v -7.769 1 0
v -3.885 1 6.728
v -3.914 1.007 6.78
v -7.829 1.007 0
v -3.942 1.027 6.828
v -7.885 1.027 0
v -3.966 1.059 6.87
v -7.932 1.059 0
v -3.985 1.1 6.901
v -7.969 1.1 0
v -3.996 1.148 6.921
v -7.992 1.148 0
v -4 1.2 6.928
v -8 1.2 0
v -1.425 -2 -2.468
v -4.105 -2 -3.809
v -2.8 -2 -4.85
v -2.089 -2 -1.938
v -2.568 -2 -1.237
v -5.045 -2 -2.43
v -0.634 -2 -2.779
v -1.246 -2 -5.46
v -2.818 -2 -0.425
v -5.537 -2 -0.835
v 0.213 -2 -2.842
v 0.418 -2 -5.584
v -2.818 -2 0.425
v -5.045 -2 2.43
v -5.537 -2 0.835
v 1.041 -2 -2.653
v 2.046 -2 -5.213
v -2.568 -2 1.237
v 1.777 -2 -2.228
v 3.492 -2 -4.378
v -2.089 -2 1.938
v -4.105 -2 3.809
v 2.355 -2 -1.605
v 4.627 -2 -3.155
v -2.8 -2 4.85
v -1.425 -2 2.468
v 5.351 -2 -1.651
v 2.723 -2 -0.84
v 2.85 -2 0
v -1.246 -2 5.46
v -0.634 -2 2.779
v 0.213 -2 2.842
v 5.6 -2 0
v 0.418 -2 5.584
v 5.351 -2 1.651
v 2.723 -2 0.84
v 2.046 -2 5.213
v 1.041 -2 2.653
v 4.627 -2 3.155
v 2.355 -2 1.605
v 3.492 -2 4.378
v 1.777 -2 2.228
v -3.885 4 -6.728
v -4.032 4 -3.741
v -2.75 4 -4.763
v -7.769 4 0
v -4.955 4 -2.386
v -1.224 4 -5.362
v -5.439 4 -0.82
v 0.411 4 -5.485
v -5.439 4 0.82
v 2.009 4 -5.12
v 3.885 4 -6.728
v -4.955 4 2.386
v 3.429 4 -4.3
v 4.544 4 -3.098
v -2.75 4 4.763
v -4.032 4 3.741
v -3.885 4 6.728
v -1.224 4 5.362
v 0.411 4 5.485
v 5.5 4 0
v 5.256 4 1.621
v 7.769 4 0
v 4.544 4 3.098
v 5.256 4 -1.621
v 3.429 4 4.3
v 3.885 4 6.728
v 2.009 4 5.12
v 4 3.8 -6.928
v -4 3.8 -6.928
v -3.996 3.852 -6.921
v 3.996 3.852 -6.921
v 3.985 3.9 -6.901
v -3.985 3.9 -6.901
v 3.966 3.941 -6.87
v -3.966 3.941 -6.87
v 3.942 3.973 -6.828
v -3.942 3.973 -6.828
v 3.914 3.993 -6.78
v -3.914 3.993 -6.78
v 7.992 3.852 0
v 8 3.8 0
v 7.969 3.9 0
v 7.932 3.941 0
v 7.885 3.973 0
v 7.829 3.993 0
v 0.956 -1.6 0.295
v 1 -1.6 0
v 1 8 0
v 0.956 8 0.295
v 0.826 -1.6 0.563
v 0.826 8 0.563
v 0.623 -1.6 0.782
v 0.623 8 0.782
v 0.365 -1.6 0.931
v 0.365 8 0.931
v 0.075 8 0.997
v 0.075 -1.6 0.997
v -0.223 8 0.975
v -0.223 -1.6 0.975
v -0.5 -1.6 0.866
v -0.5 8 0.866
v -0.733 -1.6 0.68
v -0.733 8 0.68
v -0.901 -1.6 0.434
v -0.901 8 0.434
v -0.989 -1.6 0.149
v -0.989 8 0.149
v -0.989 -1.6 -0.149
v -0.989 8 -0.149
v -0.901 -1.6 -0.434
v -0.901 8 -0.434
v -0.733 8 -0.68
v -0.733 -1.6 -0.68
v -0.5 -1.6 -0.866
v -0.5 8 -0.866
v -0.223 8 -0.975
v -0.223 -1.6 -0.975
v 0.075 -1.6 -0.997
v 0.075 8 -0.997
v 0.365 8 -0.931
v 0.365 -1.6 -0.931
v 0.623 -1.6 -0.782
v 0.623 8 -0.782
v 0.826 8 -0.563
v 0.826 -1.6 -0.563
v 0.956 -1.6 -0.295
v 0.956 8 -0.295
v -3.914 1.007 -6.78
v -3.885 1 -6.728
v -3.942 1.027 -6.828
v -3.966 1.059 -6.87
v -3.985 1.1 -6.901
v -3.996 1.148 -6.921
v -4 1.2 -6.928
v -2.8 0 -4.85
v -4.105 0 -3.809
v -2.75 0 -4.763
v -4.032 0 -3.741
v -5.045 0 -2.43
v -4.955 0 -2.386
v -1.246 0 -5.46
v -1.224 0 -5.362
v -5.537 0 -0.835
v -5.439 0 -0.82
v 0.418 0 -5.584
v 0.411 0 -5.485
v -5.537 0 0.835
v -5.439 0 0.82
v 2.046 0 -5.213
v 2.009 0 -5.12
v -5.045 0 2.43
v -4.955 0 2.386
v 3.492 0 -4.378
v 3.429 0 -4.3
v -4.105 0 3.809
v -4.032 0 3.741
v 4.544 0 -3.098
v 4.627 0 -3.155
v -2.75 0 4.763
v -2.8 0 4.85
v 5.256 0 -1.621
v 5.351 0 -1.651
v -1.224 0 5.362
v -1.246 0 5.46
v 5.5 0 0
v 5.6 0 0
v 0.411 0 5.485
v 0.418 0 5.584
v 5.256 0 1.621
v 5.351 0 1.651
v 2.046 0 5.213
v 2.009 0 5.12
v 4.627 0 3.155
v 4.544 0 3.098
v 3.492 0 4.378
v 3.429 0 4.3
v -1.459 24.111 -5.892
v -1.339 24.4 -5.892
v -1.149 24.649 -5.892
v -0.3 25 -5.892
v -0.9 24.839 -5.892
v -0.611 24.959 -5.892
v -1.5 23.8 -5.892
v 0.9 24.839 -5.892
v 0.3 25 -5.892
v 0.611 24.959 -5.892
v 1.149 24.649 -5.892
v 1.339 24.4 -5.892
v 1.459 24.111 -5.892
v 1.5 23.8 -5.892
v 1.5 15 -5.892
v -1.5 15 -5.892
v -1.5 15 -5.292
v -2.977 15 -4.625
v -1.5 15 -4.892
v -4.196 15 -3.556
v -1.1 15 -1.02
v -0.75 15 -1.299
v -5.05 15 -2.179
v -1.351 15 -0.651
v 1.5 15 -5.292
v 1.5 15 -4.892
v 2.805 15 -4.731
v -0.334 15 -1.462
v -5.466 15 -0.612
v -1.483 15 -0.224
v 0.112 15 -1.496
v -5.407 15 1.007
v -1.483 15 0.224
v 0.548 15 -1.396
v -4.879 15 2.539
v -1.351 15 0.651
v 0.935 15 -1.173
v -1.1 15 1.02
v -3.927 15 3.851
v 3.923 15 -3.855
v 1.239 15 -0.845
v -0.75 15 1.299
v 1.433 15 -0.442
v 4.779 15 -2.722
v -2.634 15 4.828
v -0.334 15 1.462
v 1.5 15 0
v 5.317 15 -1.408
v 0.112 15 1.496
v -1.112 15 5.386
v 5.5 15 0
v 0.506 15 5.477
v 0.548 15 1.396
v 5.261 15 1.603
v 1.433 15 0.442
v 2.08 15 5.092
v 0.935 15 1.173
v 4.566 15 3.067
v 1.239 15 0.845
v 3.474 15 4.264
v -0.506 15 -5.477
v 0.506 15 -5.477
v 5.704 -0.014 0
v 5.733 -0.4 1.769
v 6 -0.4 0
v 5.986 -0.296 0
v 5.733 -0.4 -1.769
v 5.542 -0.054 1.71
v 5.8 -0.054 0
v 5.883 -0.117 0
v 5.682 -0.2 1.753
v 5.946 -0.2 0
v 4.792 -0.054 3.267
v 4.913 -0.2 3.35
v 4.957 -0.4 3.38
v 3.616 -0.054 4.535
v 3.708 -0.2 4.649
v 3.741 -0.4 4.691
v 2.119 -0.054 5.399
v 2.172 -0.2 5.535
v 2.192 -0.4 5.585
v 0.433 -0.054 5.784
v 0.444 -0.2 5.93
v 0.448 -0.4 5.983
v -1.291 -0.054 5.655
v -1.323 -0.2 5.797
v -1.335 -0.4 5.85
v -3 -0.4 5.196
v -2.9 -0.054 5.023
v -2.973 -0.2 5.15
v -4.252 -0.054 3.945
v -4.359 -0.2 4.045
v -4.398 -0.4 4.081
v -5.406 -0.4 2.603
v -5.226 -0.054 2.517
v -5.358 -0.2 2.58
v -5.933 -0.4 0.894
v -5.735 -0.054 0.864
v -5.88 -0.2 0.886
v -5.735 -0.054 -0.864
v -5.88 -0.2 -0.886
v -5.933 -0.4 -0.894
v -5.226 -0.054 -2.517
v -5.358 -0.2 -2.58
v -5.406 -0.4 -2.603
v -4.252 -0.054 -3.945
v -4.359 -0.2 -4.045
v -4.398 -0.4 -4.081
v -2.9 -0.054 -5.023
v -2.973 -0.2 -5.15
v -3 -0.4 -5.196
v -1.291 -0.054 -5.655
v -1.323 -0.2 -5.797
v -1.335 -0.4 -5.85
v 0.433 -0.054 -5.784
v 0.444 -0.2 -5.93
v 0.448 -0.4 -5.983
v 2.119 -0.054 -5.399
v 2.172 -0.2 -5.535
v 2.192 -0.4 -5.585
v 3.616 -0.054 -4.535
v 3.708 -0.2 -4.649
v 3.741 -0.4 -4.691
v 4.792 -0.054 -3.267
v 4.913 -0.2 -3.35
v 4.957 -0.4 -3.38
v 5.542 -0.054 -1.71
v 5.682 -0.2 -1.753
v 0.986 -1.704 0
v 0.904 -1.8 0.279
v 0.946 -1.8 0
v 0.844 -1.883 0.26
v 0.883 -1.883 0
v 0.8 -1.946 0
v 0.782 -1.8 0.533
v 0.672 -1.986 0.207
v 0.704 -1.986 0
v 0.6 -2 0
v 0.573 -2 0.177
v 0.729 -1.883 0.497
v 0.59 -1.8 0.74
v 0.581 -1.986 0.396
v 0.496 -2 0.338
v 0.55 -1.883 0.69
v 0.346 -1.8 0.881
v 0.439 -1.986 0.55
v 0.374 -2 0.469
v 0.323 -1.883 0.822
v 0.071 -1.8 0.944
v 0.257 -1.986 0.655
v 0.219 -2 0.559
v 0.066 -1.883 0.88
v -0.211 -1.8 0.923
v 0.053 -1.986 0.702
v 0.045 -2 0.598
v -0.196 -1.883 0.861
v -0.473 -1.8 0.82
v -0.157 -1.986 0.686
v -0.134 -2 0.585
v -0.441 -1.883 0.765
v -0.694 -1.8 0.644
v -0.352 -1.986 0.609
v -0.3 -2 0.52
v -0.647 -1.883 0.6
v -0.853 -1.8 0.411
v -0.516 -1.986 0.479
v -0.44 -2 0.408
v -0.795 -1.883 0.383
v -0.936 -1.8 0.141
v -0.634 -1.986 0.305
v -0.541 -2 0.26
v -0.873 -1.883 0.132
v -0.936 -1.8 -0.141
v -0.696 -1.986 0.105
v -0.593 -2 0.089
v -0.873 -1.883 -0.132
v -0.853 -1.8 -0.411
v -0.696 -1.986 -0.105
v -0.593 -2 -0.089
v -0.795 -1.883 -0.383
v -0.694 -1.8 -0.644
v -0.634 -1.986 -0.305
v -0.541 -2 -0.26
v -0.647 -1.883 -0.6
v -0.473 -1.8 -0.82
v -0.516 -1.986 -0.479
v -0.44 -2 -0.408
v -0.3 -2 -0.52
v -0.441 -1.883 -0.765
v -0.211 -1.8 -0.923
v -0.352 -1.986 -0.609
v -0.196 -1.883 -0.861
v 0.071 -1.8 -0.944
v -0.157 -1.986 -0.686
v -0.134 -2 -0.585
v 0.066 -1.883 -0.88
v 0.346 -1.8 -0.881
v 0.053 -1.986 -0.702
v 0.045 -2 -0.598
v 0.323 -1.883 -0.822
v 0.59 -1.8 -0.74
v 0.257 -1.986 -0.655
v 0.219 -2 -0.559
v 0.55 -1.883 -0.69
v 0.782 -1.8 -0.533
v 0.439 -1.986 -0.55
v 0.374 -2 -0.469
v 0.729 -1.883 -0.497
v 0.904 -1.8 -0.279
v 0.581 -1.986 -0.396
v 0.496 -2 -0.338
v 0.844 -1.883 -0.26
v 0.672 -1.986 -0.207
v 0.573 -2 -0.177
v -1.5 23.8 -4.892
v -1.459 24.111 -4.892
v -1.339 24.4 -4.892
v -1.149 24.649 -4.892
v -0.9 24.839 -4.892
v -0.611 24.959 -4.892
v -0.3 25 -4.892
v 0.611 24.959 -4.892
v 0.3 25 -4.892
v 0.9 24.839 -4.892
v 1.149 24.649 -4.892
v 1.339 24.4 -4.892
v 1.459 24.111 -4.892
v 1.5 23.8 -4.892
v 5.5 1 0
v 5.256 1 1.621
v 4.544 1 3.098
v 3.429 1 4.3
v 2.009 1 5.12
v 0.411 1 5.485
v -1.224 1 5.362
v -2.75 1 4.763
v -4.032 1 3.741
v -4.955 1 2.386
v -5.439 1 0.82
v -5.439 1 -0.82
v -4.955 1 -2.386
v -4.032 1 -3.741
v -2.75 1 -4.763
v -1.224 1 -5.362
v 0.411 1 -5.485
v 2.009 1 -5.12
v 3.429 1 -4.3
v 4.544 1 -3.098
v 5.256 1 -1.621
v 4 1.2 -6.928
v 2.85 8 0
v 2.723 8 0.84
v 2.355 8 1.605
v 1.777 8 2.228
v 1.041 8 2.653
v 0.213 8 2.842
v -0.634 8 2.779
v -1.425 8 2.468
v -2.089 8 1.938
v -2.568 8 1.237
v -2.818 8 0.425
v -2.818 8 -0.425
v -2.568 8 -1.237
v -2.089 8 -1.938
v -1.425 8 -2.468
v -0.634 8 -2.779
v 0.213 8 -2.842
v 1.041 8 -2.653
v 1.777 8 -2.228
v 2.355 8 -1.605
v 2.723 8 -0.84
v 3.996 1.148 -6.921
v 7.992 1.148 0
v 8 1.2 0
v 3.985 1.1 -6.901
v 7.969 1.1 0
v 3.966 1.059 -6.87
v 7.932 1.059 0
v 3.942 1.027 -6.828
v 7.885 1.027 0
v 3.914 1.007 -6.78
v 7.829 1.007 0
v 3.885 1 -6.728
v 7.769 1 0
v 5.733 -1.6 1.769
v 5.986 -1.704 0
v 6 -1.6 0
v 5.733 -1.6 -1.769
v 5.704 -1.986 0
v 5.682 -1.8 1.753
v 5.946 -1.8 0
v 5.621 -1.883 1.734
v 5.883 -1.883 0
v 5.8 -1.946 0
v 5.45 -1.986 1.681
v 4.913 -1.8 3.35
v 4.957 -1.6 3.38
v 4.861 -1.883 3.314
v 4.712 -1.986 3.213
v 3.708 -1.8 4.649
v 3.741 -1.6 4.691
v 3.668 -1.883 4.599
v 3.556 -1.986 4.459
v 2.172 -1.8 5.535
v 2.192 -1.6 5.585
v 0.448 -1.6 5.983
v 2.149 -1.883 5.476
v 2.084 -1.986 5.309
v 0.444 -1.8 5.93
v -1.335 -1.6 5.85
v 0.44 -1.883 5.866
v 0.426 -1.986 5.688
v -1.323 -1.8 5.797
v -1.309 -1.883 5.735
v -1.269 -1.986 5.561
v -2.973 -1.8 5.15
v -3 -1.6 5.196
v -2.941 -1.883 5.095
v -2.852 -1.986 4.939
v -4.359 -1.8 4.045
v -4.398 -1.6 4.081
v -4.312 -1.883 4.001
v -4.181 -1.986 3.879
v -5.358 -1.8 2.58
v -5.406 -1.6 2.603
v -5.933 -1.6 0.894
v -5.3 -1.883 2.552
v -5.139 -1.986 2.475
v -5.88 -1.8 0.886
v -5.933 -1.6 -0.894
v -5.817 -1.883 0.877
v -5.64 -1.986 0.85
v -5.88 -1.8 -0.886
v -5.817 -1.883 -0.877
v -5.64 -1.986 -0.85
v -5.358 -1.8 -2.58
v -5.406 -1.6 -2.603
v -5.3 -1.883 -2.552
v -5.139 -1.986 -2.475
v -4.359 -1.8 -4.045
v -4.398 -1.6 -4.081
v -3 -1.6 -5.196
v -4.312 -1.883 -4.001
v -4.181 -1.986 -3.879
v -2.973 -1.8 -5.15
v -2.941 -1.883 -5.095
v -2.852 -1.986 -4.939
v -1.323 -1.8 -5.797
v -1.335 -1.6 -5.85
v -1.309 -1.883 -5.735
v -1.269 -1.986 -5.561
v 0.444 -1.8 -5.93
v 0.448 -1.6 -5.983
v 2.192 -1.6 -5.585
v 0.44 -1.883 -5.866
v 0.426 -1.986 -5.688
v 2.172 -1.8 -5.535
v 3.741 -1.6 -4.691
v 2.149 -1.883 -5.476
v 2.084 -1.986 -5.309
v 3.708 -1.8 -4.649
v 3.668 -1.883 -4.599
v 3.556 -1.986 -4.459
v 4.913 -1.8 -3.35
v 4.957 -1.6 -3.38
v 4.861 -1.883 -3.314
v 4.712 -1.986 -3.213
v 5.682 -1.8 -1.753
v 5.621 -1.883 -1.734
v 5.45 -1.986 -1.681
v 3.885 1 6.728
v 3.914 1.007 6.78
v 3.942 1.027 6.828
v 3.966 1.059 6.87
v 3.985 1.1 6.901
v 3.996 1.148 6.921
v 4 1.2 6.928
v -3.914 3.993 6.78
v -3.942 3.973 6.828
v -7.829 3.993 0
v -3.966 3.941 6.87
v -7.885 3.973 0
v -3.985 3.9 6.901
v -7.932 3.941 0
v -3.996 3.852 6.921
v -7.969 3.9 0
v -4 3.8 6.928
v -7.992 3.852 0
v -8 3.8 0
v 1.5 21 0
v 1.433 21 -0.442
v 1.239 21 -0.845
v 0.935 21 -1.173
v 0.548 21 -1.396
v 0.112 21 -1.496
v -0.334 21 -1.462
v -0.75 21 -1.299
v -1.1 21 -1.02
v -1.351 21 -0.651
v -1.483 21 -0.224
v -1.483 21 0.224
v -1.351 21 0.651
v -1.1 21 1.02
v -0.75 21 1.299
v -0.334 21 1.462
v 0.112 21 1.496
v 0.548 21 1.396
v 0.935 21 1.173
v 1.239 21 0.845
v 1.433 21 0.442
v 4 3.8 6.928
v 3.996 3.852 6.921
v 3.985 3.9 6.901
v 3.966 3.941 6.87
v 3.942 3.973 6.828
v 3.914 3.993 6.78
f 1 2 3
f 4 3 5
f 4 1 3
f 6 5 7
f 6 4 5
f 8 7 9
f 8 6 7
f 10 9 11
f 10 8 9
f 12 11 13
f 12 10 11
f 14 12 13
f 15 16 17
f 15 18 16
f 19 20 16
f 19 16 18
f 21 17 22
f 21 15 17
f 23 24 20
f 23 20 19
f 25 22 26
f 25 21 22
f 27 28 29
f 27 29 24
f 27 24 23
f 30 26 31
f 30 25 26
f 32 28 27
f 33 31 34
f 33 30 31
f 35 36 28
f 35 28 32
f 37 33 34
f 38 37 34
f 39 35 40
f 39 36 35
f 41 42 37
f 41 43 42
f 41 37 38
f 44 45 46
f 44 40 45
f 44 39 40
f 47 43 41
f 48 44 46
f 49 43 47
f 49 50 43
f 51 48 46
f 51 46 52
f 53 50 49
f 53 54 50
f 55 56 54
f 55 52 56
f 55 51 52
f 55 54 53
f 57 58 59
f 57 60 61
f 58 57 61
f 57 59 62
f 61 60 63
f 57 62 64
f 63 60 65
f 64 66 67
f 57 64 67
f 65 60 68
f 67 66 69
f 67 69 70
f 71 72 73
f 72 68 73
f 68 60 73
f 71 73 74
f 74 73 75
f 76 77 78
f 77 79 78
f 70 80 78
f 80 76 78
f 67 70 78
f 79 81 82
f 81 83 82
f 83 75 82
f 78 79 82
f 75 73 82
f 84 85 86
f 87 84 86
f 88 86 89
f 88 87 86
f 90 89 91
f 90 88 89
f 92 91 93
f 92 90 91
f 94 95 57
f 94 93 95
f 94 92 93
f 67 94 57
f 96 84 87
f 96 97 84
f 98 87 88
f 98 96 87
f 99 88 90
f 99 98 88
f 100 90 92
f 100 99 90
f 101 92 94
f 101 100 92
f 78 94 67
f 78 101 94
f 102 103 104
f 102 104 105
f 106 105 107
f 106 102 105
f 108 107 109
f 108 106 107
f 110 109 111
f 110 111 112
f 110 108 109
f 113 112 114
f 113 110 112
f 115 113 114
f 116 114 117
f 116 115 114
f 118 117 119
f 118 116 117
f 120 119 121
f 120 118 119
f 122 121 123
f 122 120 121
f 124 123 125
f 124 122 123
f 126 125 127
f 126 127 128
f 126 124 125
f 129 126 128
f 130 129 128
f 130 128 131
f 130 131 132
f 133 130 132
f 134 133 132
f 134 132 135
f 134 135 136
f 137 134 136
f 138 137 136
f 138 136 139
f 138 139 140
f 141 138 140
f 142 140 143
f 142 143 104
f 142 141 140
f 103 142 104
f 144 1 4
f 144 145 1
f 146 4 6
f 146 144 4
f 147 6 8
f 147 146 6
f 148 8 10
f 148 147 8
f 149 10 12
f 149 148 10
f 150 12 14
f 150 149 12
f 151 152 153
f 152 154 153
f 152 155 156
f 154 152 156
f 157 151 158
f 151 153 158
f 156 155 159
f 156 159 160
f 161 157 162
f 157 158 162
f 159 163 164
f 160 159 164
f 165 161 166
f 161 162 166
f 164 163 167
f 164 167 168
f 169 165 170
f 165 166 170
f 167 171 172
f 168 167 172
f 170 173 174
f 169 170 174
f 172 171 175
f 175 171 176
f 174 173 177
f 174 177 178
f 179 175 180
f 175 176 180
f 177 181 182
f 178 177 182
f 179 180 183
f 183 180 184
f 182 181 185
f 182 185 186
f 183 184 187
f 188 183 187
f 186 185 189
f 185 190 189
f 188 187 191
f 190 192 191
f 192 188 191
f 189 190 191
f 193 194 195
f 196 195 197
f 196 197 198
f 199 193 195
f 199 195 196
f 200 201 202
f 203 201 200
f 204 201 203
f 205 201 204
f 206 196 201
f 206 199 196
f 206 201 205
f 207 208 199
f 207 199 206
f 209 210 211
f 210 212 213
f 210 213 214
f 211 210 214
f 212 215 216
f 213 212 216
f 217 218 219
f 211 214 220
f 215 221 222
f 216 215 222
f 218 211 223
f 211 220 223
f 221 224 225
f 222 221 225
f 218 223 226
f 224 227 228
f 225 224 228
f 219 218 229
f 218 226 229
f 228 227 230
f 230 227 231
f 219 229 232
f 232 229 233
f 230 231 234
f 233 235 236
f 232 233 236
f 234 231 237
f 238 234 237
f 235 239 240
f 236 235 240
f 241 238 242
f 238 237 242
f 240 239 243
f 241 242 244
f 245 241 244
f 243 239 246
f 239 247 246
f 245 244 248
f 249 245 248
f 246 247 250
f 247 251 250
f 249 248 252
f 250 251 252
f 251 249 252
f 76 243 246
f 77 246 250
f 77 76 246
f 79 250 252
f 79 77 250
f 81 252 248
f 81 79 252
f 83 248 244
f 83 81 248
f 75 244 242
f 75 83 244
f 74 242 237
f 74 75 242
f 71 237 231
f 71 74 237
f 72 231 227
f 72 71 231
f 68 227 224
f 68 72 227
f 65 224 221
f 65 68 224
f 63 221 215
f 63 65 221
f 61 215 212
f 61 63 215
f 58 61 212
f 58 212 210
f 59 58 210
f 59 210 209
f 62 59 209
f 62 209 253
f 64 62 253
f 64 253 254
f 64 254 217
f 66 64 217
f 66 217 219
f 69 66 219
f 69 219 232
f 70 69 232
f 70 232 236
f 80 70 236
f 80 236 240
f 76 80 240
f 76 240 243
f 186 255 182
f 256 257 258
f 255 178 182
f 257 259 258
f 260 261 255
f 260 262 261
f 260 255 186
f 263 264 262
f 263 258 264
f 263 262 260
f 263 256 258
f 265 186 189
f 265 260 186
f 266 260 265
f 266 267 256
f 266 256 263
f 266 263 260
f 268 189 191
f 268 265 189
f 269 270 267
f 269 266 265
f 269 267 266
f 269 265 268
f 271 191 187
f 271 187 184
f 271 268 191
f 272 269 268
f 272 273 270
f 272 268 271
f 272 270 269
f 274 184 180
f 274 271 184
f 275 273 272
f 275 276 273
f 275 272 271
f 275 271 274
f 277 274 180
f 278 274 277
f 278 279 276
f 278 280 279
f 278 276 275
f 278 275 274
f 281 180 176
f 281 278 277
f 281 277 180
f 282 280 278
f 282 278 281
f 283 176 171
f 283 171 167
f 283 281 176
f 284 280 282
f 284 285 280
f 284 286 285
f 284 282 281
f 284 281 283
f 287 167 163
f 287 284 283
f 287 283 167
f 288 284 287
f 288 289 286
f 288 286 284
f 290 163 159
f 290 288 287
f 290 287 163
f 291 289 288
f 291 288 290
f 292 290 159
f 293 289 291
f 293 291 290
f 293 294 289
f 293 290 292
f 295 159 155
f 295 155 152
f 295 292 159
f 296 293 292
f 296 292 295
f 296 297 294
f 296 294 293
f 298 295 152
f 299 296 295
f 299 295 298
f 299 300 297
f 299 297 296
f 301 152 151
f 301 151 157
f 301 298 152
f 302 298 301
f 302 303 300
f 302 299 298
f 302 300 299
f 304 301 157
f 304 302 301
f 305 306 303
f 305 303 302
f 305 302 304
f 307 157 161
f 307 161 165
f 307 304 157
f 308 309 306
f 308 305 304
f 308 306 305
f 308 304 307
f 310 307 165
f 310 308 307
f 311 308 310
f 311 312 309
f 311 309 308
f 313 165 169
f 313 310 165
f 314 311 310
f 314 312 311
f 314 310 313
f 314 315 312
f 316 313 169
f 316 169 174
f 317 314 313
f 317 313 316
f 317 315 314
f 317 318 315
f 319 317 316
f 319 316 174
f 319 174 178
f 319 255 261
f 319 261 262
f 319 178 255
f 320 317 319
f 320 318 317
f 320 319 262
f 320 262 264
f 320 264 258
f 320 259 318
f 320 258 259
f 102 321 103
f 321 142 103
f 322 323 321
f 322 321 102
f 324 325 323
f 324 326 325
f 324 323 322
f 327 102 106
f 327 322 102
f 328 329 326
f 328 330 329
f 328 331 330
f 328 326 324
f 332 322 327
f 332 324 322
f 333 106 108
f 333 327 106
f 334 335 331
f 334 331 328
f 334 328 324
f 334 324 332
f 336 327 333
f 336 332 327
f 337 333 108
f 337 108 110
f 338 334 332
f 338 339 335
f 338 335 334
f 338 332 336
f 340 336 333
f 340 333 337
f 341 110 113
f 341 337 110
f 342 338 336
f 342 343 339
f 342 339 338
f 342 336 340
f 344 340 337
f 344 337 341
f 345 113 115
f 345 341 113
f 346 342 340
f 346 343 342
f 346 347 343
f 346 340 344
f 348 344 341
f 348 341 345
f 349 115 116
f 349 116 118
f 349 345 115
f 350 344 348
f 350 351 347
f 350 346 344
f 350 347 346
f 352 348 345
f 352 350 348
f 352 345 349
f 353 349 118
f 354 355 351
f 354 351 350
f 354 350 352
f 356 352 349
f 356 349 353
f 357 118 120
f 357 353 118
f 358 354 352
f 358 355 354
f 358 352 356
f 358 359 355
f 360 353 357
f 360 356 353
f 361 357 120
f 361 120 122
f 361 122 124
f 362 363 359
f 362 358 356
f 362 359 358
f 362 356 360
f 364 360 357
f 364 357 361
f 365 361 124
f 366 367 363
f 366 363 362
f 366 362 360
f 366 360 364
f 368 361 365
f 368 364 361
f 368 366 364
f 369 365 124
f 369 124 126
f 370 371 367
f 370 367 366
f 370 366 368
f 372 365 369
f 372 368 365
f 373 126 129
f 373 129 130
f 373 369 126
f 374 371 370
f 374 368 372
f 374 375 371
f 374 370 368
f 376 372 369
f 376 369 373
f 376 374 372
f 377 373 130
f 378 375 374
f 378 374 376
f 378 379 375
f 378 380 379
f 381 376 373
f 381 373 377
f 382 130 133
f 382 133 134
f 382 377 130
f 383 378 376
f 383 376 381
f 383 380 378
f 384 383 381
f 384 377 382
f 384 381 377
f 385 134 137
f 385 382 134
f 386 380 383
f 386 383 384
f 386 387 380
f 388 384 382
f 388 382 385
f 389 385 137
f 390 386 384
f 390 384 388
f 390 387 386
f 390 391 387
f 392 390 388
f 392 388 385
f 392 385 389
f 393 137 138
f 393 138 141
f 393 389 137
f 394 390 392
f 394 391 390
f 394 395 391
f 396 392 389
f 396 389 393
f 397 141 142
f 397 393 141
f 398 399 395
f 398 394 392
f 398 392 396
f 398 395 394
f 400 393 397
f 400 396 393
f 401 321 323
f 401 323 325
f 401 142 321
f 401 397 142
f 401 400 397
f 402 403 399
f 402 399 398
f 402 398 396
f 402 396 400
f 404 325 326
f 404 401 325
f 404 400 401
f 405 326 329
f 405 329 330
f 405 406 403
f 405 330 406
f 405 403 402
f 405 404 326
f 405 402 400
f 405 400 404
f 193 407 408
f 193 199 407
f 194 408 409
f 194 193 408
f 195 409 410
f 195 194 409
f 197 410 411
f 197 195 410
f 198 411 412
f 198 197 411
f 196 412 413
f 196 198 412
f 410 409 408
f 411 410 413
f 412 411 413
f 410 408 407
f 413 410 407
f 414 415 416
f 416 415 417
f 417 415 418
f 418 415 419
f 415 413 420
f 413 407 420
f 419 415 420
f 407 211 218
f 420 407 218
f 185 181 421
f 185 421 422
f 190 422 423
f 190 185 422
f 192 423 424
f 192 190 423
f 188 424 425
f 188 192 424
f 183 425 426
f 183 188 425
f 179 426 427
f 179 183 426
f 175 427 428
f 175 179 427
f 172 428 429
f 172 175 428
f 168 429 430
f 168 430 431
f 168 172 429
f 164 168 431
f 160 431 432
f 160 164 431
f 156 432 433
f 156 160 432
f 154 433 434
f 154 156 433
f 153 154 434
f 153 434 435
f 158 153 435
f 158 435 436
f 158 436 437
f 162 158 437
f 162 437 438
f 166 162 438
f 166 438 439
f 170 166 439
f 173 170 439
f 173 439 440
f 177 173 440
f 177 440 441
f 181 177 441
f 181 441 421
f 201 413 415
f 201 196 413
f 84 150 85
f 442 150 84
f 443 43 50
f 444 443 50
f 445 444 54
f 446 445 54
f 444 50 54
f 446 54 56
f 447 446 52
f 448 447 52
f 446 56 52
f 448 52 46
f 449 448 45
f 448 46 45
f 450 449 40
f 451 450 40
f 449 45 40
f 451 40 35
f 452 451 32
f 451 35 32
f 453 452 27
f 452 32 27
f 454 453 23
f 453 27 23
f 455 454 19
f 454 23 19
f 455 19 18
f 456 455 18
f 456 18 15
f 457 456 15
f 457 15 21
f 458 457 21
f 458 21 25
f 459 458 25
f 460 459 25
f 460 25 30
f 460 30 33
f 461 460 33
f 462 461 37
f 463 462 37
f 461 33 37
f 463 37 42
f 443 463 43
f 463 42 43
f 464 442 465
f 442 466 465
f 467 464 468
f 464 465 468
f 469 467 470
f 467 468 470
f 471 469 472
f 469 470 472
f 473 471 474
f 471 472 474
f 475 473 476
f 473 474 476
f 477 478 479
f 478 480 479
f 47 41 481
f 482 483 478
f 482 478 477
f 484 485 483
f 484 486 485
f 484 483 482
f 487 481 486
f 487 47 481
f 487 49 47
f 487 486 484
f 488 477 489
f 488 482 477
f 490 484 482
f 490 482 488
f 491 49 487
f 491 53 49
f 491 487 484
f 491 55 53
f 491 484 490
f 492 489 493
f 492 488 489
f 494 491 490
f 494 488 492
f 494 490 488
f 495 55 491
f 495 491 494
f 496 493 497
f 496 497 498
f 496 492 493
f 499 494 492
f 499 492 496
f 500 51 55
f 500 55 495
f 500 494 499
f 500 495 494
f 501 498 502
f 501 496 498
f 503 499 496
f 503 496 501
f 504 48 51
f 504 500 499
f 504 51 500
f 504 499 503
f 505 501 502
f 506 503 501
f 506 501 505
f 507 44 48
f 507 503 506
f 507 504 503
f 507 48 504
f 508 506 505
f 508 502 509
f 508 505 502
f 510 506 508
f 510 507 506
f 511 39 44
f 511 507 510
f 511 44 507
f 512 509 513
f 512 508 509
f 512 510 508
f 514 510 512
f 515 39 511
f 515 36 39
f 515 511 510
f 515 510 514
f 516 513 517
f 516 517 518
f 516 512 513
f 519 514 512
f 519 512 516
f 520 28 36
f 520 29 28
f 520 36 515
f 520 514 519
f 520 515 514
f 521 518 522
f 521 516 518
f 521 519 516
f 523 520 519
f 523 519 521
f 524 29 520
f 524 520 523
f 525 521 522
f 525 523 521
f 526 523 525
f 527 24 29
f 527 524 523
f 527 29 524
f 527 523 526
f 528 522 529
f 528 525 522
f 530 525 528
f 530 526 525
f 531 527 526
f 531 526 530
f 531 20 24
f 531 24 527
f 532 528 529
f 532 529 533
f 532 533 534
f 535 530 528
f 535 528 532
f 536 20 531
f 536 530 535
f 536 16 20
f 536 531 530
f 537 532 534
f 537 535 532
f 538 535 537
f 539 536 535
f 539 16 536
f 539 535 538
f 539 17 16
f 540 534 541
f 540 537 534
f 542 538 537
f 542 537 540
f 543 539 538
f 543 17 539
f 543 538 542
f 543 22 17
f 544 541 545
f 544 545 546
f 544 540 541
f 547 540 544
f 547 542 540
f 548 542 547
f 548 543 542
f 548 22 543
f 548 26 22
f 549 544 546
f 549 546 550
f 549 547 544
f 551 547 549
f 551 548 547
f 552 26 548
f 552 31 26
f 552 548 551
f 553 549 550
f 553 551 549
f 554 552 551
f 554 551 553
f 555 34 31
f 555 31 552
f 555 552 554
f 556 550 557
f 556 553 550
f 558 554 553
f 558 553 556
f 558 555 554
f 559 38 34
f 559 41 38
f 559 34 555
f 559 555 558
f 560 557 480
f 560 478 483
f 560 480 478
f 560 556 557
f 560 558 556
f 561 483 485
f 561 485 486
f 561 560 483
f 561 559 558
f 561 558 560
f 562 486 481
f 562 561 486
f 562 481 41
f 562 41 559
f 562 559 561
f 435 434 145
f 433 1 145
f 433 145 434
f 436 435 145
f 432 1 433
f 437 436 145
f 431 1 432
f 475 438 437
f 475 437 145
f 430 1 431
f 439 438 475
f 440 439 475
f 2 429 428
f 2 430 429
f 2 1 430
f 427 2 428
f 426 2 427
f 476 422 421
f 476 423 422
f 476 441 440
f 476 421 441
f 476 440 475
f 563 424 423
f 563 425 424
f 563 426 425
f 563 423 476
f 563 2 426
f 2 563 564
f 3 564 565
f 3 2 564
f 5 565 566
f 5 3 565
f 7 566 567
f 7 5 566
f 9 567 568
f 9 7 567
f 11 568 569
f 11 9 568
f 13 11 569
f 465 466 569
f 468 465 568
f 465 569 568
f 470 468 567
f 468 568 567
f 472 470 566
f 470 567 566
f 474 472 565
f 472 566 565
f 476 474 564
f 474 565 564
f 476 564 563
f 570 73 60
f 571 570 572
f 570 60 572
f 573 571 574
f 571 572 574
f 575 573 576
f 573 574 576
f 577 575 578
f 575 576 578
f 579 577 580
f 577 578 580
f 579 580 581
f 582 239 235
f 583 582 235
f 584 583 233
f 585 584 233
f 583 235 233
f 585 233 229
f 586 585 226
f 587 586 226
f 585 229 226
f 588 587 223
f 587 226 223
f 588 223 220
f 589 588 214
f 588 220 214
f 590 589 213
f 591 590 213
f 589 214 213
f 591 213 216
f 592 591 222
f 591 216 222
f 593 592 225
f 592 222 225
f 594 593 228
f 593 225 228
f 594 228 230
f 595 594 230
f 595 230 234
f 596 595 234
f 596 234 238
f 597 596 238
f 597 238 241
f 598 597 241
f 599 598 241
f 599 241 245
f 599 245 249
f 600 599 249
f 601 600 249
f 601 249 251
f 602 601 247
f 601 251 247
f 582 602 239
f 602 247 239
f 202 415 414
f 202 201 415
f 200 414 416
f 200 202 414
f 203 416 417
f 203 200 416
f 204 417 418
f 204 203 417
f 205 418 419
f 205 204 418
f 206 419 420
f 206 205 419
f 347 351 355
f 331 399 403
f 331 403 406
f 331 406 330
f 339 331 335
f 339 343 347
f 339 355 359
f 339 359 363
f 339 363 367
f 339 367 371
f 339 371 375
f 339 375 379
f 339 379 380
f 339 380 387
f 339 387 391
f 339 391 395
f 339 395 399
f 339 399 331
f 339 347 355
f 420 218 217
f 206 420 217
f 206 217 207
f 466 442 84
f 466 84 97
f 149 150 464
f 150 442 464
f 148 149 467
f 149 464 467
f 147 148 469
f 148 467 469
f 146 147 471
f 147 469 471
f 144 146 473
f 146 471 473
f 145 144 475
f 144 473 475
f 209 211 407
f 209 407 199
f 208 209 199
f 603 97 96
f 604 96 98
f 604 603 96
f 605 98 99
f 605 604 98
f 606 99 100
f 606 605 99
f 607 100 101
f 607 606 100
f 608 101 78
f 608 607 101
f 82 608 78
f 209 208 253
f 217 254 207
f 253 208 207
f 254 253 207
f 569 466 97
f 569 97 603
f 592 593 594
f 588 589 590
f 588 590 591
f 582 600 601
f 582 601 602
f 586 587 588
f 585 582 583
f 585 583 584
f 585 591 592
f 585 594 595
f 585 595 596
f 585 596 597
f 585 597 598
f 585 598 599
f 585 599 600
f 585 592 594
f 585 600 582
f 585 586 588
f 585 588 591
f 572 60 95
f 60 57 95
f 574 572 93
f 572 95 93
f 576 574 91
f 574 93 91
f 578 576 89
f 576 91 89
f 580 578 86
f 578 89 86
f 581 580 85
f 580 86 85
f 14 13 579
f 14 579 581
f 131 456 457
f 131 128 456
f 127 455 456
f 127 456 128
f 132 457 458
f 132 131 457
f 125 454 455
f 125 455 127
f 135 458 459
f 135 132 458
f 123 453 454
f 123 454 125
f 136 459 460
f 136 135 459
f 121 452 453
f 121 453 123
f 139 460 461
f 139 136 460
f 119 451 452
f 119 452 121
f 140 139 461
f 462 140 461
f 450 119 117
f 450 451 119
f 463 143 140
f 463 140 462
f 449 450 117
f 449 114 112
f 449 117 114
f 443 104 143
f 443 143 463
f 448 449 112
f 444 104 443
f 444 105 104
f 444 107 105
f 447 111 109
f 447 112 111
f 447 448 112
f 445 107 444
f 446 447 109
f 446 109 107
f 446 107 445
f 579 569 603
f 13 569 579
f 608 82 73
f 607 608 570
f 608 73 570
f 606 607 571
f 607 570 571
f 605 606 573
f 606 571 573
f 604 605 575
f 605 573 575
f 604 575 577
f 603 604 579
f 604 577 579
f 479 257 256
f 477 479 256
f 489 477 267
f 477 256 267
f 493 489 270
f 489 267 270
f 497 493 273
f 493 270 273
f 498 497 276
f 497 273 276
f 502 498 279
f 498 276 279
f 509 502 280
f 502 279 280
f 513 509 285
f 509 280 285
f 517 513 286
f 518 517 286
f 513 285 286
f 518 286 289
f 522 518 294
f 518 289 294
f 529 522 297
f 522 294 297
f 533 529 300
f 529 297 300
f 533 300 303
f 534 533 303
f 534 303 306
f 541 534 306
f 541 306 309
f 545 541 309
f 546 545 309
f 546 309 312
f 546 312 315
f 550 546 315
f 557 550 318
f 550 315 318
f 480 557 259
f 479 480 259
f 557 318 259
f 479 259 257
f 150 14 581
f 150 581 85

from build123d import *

# Parameters (mm, degrees)
SKETCH_R      = 5.5
PAD_DEPTH     = 15
SKETCH001_R   = 6
PAD001_DEPTH  = 2
SKETCH002_R   = 1.5
PAD002_DEPTH  = 6
SKETCH003_W   = 3
SKETCH003_H   = 1
PAD003_DEPTH  = 10
SKETCH004_R   = 2.85
SKETCH004_R_2 = 1
POCKET_DEPTH  = 10
FILLET_R      = 1.2
FILLET001_R   = 0.4
SKETCH005_R   = 5
PAD004_DEPTH  = 3
FILLET002_R   = 0.2


with BuildPart() as part:
    # Sketch → Pad (new body)
    with BuildSketch(Plane.XZ):
        Circle(SKETCH_R)
    extrude(amount=-PAD_DEPTH)

    # Sketch001 → Pad001 (join)
    with BuildSketch(Plane.XZ):
        Circle(SKETCH001_R)
    extrude(amount=PAD001_DEPTH)

    # Sketch002 (on Face5 of Pad001) → Pad002 (join)
    with BuildSketch(Plane(origin=(0, 15, 0), x_dir=(1, 0, 0), z_dir=(0, 1, 0))):
        Circle(SKETCH002_R)
    extrude(amount=PAD002_DEPTH)

    # Sketch003 (on Face5 of Pad002) → Pad003 (join)
    with BuildSketch(Plane(origin=(0, 15, 0), x_dir=(1, 0, 0), z_dir=(0, 1, 0))):
        with Locations((0, 5.391628)):
            Rectangle(SKETCH003_W, SKETCH003_H)
    extrude(amount=PAD003_DEPTH)

    # Sketch004 (on Face3 of Pad003) → Pocket (cut)
    with BuildSketch(Plane.XZ.offset(2)):
        Circle(SKETCH004_R)
        Circle(SKETCH004_R_2, mode=Mode.SUBTRACT)
    extrude(amount=-POCKET_DEPTH, mode=Mode.SUBTRACT)

    # Fillet
    fillet_edges = [part.edges().sort_by_distance(p)[0] for p in [
        (1.5, 25, -5.391628),
        (-1.5, 25, -5.391628),
    ]]
    fillet(fillet_edges, radius=FILLET_R)

    # Fillet001
    fillet001_edges = [part.edges().sort_by_distance(p)[0] for p in [
        (-6, -2, 0),
        (-6, 0, 0),
        (-1, -2, 0),
    ]]
    fillet(fillet001_edges, radius=FILLET001_R)

    # Sketch005 (on DatumPlane) → Pad004 (join)
    with BuildSketch(Plane.XZ.offset(-1)):
        Polygon((4, -6.928203), (8, 0), (4, 6.928203), (-4, 6.928203), (-8, 0), (-4, -6.928203), align=None)
        Circle(SKETCH005_R, mode=Mode.SUBTRACT)
    extrude(amount=-PAD004_DEPTH)

    # Fillet002
    fillet002_edges = [part.edges().sort_by_distance(p)[0] for p in [
        (0, 1, -6.928203),
        (6, 1, -3.464102),
        (0, 1, 6.928203),
        (6, 1, 3.464102),
        (-6, 1, -3.464102),
        (-6, 1, 3.464102),
        (-6, 4, 3.464102),
        (-6, 4, -3.464102),
        (0, 4, 6.928203),
        (6, 4, 3.464102),
        (6, 4, -3.464102),
        (0, 4, -6.928203),
    ]]
    fillet(fillet002_edges, radius=FILLET002_R)


solid = part.part
